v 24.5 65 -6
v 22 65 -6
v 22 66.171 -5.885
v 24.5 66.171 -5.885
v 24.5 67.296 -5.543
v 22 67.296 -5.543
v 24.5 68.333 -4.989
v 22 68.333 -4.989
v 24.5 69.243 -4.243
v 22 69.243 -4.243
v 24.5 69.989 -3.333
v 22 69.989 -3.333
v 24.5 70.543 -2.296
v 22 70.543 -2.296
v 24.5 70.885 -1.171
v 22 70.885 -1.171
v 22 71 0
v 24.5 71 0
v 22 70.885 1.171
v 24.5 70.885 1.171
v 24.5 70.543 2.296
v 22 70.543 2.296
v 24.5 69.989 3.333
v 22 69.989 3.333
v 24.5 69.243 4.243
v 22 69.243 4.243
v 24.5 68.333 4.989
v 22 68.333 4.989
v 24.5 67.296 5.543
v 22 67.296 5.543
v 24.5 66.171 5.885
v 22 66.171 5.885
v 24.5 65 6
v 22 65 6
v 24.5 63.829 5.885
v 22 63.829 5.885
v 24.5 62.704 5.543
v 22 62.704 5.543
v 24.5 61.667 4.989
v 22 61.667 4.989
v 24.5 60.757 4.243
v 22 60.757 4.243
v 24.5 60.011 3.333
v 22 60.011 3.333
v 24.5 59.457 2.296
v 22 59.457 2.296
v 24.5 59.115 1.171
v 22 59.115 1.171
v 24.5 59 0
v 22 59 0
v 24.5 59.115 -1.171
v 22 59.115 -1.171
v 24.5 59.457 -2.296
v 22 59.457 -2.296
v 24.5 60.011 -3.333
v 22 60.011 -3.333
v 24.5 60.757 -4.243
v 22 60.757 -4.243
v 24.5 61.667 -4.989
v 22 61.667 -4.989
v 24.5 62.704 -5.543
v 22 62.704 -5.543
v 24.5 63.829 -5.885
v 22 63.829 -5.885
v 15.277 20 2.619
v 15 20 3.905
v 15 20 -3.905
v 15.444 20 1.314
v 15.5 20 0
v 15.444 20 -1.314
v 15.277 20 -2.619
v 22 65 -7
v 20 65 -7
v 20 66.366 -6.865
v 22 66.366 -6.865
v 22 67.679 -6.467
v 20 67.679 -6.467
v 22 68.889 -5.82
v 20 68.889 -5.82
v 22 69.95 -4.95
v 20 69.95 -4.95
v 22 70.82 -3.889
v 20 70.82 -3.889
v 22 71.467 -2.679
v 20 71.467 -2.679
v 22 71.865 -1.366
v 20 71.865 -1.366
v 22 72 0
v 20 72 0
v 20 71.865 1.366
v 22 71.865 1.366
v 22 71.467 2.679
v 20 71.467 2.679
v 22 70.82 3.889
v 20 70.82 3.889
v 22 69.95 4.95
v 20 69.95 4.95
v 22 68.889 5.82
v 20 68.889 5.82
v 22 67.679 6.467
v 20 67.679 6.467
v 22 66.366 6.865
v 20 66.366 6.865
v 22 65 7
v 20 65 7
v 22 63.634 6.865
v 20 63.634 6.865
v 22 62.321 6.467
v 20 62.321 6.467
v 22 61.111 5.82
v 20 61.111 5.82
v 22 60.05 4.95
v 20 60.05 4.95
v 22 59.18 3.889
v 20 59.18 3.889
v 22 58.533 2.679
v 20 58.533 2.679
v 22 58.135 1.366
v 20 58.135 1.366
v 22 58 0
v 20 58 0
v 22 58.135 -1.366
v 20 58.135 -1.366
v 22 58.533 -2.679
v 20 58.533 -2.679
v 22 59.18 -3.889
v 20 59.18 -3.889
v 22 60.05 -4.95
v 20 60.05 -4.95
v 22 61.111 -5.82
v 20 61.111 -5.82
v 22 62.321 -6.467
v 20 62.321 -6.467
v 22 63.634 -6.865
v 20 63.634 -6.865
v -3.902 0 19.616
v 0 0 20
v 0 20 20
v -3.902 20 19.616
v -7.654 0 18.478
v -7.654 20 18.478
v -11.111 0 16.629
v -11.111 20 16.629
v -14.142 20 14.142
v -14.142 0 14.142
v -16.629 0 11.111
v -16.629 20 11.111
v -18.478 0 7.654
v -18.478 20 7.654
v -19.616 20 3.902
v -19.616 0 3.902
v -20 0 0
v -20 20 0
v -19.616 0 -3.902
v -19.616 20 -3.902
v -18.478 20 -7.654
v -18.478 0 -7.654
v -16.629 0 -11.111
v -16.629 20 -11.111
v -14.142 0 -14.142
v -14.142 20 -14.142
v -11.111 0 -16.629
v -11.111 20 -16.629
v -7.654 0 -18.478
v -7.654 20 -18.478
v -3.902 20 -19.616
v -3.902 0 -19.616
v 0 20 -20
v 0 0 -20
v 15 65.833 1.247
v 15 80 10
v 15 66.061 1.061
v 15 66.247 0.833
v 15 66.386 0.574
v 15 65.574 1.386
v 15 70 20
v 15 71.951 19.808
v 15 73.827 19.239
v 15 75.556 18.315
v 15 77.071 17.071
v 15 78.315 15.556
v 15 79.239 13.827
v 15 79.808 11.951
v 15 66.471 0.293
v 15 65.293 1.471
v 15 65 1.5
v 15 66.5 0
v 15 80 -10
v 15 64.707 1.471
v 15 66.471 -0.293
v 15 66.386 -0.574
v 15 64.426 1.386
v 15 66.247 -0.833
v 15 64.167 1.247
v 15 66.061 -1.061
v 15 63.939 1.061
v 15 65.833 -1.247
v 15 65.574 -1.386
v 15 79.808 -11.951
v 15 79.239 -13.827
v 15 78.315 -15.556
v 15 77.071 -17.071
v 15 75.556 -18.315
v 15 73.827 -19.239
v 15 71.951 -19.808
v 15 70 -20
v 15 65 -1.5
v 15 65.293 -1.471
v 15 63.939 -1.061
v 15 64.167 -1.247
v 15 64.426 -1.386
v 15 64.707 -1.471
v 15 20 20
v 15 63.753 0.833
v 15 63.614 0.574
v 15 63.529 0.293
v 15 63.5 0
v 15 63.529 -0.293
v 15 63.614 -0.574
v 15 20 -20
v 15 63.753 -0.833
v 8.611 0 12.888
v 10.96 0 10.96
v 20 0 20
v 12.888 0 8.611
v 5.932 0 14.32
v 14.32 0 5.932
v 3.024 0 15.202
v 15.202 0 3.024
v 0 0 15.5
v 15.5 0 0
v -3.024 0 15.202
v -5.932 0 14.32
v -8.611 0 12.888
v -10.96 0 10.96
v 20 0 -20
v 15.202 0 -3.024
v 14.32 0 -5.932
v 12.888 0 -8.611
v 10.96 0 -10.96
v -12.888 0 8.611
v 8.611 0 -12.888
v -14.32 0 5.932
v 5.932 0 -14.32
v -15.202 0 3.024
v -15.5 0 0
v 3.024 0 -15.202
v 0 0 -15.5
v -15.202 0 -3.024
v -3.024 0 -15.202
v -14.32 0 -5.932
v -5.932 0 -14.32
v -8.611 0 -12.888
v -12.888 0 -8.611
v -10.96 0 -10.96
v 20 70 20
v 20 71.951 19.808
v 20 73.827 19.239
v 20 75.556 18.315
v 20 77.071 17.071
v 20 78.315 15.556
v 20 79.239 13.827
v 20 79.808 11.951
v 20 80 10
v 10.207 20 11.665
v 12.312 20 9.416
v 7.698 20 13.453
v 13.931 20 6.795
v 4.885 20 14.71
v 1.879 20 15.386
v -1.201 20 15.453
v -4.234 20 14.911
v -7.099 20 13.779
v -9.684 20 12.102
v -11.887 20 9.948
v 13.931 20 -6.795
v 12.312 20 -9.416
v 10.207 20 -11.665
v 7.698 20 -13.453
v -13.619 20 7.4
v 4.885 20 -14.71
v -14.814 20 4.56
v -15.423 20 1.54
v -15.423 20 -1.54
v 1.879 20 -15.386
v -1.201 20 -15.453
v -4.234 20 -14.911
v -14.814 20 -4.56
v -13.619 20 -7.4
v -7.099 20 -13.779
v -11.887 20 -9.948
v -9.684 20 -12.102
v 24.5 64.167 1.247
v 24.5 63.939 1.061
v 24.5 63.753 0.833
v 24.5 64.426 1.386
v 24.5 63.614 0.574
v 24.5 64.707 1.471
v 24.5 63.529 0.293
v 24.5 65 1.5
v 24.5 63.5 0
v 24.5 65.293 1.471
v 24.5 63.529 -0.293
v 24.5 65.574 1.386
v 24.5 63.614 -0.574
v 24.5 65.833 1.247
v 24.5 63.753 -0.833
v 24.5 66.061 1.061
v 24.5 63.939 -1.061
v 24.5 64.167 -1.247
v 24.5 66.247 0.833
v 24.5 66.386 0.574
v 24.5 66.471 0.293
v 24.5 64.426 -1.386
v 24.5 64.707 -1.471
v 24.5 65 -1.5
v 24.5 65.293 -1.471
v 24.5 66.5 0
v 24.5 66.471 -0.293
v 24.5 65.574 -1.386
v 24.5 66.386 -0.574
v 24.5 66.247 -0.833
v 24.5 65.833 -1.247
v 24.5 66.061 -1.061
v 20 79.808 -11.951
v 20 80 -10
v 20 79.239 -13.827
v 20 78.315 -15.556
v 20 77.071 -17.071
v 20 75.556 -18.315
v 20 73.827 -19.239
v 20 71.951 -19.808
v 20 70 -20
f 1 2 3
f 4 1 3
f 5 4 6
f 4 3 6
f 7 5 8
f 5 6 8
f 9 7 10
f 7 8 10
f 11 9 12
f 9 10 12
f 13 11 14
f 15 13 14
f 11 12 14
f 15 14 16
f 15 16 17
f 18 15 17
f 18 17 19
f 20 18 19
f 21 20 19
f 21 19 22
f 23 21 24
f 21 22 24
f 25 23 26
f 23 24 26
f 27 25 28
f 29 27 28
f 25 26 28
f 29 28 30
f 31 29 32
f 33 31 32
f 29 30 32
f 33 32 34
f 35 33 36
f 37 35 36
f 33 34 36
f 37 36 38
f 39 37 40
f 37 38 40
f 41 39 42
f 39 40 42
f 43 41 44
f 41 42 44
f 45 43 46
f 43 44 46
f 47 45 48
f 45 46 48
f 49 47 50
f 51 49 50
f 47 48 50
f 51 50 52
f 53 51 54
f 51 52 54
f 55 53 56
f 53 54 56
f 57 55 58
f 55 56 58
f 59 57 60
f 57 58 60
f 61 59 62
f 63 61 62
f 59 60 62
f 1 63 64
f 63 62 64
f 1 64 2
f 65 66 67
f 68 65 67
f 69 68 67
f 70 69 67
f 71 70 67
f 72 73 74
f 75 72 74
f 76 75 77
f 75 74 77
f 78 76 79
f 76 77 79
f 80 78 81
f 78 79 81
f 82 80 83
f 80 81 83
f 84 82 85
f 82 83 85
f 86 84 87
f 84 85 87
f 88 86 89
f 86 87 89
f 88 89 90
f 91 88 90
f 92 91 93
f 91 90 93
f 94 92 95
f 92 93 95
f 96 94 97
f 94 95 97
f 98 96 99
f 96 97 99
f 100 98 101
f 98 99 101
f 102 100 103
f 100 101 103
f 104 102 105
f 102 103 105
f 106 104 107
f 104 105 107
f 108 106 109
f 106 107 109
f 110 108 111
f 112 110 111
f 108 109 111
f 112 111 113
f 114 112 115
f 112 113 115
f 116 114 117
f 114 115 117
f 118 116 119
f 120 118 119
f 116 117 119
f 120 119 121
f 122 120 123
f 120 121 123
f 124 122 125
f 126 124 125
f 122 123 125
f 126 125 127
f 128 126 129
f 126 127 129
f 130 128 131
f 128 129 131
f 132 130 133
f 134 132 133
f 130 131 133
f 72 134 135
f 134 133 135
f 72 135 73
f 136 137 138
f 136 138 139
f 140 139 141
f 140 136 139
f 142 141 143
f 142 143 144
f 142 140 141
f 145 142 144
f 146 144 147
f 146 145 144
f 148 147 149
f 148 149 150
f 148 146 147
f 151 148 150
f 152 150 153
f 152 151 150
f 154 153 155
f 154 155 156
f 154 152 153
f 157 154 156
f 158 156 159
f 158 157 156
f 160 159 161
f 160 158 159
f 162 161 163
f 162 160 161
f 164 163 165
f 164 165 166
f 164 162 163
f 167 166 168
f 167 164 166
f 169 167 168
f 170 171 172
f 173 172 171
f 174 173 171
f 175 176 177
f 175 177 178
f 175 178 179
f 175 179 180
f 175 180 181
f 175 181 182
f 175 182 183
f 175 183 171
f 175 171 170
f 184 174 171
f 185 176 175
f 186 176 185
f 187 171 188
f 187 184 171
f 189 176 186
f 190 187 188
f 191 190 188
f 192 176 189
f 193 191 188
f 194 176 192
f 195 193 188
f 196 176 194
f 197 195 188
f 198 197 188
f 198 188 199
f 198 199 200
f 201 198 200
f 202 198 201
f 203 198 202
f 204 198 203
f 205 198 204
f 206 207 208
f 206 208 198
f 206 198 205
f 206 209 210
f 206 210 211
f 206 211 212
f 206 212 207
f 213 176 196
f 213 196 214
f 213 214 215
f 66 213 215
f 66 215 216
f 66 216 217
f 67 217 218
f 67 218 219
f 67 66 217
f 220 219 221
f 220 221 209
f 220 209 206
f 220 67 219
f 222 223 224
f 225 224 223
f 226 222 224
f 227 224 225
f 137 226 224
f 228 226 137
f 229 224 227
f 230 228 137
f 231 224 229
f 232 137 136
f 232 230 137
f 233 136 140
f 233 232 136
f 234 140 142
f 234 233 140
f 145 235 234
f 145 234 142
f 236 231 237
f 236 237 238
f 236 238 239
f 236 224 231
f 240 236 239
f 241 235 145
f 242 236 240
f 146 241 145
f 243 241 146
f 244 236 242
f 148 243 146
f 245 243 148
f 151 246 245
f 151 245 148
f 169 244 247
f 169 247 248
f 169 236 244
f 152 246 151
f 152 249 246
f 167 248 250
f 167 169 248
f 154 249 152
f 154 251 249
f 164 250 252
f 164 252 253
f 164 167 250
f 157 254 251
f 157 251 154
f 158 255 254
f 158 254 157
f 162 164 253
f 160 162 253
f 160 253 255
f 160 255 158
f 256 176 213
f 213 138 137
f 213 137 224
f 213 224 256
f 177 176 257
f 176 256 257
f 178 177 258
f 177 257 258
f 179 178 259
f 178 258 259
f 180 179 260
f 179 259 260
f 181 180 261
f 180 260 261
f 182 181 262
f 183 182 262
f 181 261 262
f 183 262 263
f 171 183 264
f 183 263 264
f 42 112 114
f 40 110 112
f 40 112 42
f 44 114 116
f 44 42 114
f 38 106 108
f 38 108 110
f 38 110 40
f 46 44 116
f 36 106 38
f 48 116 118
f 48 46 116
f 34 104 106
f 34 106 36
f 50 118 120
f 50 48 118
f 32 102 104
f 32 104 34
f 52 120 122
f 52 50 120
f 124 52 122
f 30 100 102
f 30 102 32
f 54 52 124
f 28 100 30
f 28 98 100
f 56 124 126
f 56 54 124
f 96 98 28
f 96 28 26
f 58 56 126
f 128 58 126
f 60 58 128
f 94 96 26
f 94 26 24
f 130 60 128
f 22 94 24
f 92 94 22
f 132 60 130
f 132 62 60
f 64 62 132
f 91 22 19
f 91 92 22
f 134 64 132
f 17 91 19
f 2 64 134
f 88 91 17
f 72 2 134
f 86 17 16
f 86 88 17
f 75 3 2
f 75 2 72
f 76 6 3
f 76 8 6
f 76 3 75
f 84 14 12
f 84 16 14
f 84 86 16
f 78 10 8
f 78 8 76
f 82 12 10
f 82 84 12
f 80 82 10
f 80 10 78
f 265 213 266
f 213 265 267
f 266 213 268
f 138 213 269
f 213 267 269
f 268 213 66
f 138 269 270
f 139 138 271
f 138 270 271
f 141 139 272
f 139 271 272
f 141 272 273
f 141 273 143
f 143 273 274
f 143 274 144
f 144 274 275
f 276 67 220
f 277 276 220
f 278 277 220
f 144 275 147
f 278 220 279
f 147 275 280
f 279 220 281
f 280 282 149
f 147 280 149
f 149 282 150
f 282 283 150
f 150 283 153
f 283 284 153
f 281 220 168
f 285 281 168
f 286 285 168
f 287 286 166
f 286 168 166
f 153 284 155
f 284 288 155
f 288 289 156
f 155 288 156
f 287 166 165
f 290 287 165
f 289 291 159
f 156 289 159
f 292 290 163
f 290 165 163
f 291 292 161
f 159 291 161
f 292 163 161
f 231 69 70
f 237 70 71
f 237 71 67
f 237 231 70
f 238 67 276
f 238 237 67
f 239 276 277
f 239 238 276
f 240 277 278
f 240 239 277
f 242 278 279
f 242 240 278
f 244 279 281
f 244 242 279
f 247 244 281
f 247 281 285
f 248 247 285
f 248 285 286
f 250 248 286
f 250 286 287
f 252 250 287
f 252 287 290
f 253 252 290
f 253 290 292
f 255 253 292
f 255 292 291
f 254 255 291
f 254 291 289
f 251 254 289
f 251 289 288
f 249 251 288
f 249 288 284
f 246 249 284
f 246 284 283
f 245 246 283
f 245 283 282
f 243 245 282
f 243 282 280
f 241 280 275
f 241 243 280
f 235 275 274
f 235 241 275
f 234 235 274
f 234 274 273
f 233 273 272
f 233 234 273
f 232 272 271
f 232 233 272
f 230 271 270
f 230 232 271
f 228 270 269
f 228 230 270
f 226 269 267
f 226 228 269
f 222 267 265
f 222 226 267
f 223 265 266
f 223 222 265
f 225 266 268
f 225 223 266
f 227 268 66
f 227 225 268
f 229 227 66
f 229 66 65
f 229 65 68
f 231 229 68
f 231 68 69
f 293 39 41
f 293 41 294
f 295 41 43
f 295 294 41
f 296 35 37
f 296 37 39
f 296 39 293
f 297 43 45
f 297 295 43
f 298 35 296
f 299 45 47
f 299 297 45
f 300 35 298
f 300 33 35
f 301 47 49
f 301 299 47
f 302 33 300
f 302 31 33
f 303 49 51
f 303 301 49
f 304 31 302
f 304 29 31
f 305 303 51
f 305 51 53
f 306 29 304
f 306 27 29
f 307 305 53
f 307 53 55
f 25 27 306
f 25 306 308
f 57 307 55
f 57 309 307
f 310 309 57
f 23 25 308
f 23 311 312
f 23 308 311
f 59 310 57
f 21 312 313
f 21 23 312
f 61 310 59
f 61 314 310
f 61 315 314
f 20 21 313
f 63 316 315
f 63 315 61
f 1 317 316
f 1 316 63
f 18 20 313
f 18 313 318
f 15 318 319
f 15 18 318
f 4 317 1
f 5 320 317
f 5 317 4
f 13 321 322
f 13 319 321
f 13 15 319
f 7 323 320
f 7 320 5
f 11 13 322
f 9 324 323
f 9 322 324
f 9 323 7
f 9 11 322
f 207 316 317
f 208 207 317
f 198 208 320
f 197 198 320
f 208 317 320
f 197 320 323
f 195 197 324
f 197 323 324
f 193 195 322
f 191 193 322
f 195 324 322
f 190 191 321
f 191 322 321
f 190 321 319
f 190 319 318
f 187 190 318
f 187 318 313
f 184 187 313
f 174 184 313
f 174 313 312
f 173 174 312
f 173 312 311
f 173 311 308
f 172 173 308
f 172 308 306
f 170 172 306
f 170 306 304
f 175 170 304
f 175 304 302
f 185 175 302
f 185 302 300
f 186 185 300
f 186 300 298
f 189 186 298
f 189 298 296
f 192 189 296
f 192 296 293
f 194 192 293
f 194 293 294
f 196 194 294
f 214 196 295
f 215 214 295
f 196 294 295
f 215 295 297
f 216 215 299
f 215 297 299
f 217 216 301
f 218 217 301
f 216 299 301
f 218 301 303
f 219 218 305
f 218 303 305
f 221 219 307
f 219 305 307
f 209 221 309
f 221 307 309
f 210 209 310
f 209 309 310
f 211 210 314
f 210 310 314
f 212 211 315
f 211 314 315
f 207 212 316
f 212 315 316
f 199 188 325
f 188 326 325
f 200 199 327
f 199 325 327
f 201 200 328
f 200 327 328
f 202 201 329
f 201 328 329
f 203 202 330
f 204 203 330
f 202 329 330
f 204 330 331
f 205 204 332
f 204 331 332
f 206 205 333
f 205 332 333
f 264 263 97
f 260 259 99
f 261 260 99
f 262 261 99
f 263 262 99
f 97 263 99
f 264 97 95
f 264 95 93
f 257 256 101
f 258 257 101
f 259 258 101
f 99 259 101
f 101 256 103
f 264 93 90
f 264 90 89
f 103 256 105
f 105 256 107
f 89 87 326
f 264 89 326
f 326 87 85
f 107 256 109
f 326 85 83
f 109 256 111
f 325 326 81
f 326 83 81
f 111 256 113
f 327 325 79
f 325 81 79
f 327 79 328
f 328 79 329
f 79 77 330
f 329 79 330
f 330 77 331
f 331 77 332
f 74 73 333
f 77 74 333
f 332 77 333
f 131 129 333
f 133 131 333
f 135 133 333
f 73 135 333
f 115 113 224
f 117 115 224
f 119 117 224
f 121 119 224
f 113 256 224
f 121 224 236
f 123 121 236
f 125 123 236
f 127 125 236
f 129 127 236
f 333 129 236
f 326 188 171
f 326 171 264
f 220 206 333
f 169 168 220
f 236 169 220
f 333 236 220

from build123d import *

# Parameters (mm, degrees)
SKETCH_1_R          = 15.5
EXTRUDE_2_DEPTH     = 20
SKETCH_2_W          = 5
SKETCH_2_H          = 40
EXTRUDE_3_DEPTH     = 60
SKETCH_3_R          = 7
EXTRUDE_4_DEPTH     = 2
SKETCH_4_R          = 6
EXTRUDE_5_DEPTH     = 2.5
SKETCH_5_R          = 1.5
CUT_EXTRUDE_1_DEPTH = 45.5
FILLET_1_R          = 10


with BuildPart() as part:
    # Эскиз1 → Бобышка-Вытянуть2 (new body)
    with BuildSketch(Plane(origin=(0, 0, 0), x_dir=(1, 0, 0), z_dir=(0, 1, 0))):
        with BuildLine():
            Line((0, 20), (20, 20))
            Line((20, 20), (20, -20))
            Line((20, -20), (0, -20))
            ThreePointArc((0, -20), (-20, 0), (0, 20))
        make_face()
        Circle(SKETCH_1_R, mode=Mode.SUBTRACT)
    extrude(amount=EXTRUDE_2_DEPTH)

    # Эскиз2 → Бобышка-Вытянуть3 (add)
    with BuildSketch(Plane(origin=(0, 20, 0), x_dir=(1, 0, 0), z_dir=(0, 1, 0))):
        with Locations((17.5, 0)):
            Rectangle(SKETCH_2_W, SKETCH_2_H)
    extrude(amount=EXTRUDE_3_DEPTH)

    # Эскиз3 → Бобышка-Вытянуть4 (add)
    with BuildSketch(Plane(origin=(20, 0, 0), x_dir=(0, 0, -1), z_dir=(1, 0, 0))):
        with Locations((0, 65)):
            Circle(SKETCH_3_R)
    extrude(amount=EXTRUDE_4_DEPTH)

    # Эскиз4 → Бобышка-Вытянуть5 (add)
    with BuildSketch(Plane(origin=(22, 0, 0), x_dir=(0, 0, -1), z_dir=(1, 0, 0))):
        with Locations((0, 65)):
            Circle(SKETCH_4_R)
    extrude(amount=EXTRUDE_5_DEPTH)

    # Эскиз5 → Вырез-Вытянуть1 (cut, through all)
    with BuildSketch(Plane(origin=(24.5, 0, 0), x_dir=(0, 0, -1), z_dir=(1, 0, 0))):
        with Locations((0, 65)):
            Circle(SKETCH_5_R)
    extrude(amount=-CUT_EXTRUDE_1_DEPTH, mode=Mode.SUBTRACT)

    # Скругление1
    fillet_1_edges = [part.edges().sort_by_distance(p)[0] for p in [
        (17.5, 80, -20),
        (17.5, 80, 20),
    ]]
    fillet(fillet_1_edges, radius=FILLET_1_R)


solid = part.part
